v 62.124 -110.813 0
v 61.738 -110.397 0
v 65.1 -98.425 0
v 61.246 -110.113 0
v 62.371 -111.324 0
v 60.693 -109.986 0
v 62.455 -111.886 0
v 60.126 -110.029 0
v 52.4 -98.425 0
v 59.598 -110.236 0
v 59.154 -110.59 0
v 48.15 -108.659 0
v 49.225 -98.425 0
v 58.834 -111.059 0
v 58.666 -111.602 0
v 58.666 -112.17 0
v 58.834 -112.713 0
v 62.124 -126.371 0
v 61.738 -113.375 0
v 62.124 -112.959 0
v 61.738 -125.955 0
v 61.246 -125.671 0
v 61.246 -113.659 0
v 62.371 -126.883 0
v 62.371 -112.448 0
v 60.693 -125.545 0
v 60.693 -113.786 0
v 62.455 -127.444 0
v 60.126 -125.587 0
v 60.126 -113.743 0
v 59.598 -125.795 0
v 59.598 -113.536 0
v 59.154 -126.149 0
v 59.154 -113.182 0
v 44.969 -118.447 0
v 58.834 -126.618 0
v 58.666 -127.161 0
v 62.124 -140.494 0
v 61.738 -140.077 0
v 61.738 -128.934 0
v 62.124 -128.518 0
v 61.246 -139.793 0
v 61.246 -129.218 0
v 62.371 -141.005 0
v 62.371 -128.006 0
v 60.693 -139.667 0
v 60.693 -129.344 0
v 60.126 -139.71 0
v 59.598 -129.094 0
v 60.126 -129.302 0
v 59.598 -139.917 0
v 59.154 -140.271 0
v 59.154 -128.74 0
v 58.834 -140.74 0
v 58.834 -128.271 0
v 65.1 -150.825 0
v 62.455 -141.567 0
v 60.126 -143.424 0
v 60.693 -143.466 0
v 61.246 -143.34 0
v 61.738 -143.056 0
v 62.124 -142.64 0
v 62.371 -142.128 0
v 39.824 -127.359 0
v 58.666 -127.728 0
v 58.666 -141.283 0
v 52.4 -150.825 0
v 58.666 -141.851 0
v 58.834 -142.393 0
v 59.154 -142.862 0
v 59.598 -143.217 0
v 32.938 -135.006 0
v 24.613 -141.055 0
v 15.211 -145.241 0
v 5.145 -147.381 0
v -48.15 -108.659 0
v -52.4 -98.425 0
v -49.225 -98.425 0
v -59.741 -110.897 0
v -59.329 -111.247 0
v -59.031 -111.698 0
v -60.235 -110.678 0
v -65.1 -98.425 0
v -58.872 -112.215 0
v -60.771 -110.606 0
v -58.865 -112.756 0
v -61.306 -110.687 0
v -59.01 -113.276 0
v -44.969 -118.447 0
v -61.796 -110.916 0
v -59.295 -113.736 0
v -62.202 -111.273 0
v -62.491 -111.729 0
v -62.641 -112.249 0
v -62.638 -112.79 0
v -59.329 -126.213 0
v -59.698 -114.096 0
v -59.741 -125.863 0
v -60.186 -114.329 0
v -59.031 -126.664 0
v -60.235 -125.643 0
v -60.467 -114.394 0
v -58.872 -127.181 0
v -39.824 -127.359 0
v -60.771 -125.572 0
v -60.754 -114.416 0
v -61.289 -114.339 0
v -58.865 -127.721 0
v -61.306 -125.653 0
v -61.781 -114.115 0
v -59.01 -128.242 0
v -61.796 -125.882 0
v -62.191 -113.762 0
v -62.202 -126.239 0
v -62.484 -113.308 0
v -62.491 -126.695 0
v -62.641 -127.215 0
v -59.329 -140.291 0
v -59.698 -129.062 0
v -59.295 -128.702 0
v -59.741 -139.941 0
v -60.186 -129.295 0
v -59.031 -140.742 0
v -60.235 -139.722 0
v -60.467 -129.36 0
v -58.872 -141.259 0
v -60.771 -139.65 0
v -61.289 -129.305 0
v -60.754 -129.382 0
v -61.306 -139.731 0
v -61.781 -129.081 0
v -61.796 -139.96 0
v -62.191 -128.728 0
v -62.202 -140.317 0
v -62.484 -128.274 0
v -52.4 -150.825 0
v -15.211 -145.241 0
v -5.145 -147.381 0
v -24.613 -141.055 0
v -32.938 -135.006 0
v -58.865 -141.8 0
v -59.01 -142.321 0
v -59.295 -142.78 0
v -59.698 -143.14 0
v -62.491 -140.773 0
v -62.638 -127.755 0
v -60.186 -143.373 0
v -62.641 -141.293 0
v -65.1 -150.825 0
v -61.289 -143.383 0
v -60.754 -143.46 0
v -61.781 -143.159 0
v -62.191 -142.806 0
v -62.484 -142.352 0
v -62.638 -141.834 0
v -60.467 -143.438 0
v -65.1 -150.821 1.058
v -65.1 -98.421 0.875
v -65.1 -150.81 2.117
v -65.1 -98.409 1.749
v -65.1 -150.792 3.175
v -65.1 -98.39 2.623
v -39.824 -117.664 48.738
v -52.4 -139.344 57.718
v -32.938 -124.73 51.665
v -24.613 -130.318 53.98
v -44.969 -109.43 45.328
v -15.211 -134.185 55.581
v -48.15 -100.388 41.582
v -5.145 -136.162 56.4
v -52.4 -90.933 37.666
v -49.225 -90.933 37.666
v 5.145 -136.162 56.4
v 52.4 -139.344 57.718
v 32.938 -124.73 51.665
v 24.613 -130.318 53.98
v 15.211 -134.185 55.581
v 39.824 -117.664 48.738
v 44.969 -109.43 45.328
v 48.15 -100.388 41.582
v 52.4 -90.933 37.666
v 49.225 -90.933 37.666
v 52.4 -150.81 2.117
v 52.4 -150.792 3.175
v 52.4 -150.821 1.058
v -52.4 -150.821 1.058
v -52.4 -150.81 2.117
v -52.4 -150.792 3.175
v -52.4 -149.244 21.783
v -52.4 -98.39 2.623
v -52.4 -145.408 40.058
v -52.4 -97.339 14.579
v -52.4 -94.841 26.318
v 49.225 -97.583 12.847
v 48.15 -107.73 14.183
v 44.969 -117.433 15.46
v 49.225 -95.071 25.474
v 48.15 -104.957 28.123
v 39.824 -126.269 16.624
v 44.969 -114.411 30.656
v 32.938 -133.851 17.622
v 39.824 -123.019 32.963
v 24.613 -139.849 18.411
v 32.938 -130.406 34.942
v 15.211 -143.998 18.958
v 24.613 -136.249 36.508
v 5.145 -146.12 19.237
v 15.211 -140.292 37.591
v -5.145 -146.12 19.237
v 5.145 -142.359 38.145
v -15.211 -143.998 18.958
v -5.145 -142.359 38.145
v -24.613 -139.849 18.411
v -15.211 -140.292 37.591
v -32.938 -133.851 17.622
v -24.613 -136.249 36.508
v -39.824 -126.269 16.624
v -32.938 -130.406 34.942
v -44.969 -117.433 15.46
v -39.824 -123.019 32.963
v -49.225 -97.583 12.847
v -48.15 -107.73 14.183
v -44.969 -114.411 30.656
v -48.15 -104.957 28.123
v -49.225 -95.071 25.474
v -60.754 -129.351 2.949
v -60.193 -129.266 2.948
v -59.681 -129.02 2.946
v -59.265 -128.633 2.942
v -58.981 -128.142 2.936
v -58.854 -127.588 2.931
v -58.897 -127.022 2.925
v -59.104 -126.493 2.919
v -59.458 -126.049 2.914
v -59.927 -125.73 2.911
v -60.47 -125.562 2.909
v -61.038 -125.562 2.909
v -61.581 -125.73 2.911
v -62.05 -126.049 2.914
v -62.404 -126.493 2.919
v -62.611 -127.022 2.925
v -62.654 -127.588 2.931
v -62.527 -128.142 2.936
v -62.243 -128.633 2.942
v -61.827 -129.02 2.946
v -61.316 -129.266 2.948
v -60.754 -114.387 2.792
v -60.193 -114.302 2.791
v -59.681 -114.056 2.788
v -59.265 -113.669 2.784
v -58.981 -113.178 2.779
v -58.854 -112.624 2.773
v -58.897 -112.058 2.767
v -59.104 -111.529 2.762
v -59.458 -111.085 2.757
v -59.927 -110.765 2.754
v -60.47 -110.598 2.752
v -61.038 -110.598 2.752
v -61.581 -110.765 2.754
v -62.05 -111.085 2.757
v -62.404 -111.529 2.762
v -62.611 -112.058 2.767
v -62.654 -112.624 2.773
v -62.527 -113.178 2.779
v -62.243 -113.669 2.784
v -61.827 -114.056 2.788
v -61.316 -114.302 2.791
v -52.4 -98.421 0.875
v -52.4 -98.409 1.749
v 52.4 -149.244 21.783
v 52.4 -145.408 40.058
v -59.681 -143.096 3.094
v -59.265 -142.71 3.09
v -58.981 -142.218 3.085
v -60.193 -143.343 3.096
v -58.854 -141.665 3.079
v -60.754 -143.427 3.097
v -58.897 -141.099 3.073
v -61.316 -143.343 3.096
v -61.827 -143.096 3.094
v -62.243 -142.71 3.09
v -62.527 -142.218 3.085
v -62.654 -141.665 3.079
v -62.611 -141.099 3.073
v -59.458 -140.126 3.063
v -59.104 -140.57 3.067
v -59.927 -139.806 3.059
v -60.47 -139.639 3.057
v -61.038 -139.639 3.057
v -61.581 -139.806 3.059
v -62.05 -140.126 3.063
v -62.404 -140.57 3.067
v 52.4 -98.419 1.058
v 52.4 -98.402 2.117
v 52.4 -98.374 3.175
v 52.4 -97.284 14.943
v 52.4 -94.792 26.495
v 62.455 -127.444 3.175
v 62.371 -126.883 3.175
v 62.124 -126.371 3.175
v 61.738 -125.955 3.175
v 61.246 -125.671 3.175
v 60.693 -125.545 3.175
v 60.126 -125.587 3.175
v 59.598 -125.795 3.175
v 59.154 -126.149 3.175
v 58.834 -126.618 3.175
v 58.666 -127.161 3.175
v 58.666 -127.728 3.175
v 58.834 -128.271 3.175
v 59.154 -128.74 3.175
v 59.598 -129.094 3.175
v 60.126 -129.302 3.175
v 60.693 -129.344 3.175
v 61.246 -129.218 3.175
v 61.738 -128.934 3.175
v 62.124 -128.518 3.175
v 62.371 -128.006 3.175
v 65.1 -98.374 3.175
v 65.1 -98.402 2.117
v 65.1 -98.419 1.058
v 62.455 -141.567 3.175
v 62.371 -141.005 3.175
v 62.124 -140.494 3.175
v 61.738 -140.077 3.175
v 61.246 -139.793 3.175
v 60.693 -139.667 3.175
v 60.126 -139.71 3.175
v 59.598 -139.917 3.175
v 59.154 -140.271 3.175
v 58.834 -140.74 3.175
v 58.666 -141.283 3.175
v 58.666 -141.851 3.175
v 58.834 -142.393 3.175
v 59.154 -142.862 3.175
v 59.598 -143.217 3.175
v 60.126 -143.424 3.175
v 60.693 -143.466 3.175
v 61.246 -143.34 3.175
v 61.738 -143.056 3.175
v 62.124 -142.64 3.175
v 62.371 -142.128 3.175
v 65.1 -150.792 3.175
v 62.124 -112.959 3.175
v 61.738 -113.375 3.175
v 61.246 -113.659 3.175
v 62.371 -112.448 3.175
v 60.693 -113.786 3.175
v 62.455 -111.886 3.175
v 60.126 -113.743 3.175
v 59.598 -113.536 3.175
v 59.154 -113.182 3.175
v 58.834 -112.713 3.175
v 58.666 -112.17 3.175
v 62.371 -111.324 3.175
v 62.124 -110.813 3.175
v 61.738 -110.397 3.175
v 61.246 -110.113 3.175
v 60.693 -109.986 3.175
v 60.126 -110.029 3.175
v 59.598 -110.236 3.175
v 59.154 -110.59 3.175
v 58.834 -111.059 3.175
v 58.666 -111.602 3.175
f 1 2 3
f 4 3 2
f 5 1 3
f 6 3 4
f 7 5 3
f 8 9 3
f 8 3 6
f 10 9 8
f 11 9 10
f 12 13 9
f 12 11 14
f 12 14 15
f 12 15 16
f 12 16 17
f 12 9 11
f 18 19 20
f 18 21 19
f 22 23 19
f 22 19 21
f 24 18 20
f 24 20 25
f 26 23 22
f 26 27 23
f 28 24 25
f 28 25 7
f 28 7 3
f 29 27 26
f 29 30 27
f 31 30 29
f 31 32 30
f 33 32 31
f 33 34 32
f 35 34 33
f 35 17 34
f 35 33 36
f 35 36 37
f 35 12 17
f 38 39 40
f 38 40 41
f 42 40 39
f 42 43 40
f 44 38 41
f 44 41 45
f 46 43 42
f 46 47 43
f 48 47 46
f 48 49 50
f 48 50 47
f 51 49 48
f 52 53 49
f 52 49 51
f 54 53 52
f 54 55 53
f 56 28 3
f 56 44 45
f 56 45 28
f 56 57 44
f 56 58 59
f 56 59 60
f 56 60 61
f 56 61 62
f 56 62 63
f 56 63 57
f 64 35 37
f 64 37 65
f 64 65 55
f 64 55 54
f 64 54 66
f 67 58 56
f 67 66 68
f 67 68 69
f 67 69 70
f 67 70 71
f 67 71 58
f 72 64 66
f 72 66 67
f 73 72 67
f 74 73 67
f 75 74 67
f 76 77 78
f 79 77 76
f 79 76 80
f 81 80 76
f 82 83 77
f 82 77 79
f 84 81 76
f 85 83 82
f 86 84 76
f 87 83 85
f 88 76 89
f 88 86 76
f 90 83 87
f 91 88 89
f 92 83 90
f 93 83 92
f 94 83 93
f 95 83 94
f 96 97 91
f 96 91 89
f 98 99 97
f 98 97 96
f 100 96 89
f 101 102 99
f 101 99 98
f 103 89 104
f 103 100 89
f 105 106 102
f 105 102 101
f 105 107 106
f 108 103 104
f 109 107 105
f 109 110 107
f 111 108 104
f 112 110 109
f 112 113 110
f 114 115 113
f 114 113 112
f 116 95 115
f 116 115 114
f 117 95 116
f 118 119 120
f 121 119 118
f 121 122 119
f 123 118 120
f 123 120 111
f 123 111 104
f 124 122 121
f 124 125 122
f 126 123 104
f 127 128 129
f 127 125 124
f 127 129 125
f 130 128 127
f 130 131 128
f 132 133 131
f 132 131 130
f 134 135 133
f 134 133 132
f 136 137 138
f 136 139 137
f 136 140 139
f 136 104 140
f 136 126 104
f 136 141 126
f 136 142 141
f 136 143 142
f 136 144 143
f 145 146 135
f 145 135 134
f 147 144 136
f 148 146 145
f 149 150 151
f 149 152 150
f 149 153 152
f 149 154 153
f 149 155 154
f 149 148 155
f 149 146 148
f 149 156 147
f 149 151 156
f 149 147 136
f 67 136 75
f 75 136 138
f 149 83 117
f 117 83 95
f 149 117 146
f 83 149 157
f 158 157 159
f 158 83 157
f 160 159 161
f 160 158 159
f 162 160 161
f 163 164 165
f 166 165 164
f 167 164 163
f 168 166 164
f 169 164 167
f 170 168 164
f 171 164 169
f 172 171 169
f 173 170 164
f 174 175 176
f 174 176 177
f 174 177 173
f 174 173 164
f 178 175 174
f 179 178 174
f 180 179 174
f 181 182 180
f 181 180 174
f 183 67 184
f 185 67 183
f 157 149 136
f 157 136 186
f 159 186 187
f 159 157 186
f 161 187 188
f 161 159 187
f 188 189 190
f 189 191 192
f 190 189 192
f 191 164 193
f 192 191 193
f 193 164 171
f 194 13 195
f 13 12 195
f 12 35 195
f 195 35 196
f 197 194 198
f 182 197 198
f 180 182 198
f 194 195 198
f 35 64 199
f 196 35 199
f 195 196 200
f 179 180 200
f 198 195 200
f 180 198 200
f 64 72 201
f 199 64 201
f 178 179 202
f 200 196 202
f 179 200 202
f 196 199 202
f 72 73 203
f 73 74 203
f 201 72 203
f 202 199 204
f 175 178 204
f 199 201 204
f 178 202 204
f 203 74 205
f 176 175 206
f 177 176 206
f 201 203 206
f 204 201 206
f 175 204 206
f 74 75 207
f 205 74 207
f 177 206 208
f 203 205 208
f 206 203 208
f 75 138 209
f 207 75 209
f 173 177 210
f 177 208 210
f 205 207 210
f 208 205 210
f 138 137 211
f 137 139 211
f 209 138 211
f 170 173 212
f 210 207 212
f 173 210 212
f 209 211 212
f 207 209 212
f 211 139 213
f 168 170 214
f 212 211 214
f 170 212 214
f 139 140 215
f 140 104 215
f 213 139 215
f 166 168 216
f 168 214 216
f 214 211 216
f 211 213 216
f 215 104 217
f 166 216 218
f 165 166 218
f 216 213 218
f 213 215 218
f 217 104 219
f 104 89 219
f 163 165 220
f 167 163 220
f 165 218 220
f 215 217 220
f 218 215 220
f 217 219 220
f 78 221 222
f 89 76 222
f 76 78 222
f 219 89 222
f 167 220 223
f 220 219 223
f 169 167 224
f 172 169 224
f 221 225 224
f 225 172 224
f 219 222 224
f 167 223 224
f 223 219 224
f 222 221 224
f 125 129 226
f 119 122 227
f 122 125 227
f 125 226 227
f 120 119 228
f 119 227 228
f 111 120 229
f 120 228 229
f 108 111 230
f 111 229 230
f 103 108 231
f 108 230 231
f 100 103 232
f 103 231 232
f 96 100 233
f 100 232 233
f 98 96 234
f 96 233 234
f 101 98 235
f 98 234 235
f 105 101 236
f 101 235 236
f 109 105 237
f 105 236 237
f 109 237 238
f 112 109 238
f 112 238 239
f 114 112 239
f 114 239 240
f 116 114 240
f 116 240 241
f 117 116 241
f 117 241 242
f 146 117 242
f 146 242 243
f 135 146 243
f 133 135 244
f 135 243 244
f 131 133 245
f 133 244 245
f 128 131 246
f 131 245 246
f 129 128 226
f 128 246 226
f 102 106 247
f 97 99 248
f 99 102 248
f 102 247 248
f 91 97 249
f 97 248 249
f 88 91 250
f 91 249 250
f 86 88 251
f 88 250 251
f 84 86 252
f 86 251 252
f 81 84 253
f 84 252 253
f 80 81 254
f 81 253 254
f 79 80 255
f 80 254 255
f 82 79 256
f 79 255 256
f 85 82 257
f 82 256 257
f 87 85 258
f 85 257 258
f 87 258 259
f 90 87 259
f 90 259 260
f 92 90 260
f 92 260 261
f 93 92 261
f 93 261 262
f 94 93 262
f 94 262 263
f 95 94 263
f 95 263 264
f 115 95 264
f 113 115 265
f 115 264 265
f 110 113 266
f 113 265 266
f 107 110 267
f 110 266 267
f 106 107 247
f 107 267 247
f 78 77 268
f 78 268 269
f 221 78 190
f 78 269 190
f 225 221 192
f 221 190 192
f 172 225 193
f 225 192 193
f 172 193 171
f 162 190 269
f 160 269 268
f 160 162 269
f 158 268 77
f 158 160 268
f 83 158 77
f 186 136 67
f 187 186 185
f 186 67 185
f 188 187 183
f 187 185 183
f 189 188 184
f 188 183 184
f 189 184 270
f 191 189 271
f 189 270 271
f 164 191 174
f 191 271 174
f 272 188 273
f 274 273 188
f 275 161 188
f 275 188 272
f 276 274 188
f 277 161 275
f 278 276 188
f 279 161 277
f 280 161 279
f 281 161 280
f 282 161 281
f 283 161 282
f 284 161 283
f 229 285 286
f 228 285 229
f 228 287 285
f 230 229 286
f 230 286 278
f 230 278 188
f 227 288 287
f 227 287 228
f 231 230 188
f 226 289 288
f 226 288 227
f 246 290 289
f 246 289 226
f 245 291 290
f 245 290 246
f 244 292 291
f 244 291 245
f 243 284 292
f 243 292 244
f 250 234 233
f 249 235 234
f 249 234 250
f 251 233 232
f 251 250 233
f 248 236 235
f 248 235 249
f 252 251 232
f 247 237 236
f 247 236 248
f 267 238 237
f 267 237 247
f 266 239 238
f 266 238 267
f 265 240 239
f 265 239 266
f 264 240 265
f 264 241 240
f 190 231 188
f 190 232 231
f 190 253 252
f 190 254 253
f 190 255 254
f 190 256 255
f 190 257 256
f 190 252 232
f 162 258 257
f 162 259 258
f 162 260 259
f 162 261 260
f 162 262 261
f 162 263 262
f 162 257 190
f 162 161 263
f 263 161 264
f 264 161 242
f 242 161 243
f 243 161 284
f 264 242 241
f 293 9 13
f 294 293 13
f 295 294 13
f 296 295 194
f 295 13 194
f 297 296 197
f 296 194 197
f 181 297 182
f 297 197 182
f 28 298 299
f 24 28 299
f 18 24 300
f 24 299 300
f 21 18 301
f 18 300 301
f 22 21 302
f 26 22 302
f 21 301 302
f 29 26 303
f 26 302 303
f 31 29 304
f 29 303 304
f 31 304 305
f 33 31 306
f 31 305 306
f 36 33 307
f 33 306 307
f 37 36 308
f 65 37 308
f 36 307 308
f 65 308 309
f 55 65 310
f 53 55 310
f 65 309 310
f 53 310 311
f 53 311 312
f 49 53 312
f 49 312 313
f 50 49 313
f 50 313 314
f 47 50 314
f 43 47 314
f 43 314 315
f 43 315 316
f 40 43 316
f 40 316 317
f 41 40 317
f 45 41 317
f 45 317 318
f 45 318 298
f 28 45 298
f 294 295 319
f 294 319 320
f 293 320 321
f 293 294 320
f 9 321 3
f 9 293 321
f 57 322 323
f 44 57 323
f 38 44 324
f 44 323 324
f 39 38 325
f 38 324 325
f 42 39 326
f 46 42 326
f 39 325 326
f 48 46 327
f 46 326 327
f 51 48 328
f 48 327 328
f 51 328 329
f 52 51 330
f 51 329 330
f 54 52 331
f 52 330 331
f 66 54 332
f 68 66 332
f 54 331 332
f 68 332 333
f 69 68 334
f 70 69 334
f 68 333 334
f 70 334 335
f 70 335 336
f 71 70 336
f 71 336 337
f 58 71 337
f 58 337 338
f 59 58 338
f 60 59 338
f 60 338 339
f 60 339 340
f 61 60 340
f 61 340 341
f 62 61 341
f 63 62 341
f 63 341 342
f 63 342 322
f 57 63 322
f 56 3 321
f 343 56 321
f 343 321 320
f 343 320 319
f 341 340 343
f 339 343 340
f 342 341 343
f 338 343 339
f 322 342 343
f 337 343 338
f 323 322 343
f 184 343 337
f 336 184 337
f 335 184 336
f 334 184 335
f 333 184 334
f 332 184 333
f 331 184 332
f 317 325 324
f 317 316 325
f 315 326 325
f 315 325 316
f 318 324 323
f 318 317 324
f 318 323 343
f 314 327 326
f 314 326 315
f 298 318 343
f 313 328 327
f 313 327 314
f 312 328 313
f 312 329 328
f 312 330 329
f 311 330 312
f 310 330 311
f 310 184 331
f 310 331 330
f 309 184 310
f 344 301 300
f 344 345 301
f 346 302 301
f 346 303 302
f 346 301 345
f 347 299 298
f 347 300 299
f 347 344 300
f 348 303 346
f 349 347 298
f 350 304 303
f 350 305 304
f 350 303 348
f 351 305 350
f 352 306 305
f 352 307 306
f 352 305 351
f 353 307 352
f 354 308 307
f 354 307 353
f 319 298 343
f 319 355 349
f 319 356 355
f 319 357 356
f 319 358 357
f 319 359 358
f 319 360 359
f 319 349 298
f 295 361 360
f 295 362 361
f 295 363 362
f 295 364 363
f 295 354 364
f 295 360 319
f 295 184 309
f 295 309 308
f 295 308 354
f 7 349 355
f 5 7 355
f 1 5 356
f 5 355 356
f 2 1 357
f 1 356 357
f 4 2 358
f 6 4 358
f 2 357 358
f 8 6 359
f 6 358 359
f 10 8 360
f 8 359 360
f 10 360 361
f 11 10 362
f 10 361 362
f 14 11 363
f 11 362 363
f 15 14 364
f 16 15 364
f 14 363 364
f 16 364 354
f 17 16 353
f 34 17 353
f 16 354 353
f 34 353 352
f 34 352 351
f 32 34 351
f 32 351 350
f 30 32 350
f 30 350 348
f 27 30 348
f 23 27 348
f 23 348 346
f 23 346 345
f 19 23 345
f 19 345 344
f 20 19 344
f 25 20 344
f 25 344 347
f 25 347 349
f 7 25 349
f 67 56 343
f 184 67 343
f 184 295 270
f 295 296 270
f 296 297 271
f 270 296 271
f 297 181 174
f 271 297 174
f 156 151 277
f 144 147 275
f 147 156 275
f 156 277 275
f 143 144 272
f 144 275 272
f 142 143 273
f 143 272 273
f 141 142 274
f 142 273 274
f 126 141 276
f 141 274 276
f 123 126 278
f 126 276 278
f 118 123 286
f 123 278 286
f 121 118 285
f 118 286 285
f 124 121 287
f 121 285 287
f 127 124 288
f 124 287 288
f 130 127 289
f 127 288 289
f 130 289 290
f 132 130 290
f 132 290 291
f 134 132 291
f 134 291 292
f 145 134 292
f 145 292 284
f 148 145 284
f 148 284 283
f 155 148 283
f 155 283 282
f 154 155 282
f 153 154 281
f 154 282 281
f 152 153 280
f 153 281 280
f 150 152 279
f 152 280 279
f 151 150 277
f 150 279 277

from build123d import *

# Parameters (mm, degrees)
REVOLVE8_ANGLE      = 22.5
BOSS_EXTRUDE3_START = 12.7
BOSS_EXTRUDE3_DEPTH = 12.7
BOSS_EXTRUDE4_DEPTH = 12.7
SKETCH12_R          = 1.905
CUT_EXTRUDE4_DEPTH  = 3.175
SKETCH13_R          = 1.905
CUT_EXTRUDE5_DEPTH  = 3.175


with BuildPart() as part:
    # Sketch9 → Revolve8 (revolve)
    with BuildSketch(Plane.XY):
        with BuildLine():
            Line((-49.2252, -98.425), (-52.4002, -98.425))
            Line((-52.4002, -98.425), (-52.4002, -150.8252))
            Line((-52.4002, -150.8252), (52.4002, -150.8252))
            Line((52.4002, -150.8252), (52.4002, -98.425))
            Line((52.4002, -98.425), (49.2252, -98.425))
            ThreePointArc((49.2252, -98.425), (0, -147.6502), (-49.2252, -98.425))
        make_face()
    revolve(axis=Axis((-38.048924234, 0, 0), (-1, 0, 0)), revolution_arc=REVOLVE8_ANGLE)

    # Sketch11 → Boss-Extrude3 (add)
    with BuildSketch(Plane.ZY.offset(52.4002).offset(BOSS_EXTRUDE3_START)):
        with BuildLine():
            Line((0, -98.425), (0, -150.8252))
            ThreePointArc((0, -150.8252), (1.5875, -150.816845209), (3.174824124, -150.791781762))
            Line((3.174824124, -150.791781762), (2.623242695, -98.390036197))
            ThreePointArc((2.623242695, -98.390036197), (1.311737846, -98.416258661), (0, -98.425))
        make_face()
    extrude(amount=-BOSS_EXTRUDE3_DEPTH)

    # Sketch10 → Boss-Extrude4 (add)
    with BuildSketch(Plane(origin=(52.4002, 0, 0), x_dir=(0, 0, -1), z_dir=(1, 0, 0))):
        with BuildLine():
            Line((0, -98.425), (0, -150.8252))
            Line((0, -150.8252), (-3.174824124, -150.791781762))
            Line((-3.174824124, -150.791781762), (-3.174824124, -98.37378267))
            ThreePointArc((-3.174824124, -98.37378267), (-1.587618613, -98.412194834), (0, -98.425))
        make_face()
    extrude(amount=BOSS_EXTRUDE4_DEPTH)

    # Sketch12 → Cut-Extrude4 (cut)
    with BuildSketch(Plane.XY.offset(3.174824124)):
        with Locations((60.550186424, -111.886000657)):
            Circle(SKETCH12_R)
        with Locations((60.550186424, -141.566764633)):
            Circle(SKETCH12_R)
        with Locations((60.550186424, -127.4445)):
            Circle(SKETCH12_R)
    extrude(amount=-CUT_EXTRUDE4_DEPTH, mode=Mode.SUBTRACT)

    # Sketch13 → Cut-Extrude5 (cut)
    with BuildSketch(Plane(origin=(0, -0.008353865, 1.587675876), x_dir=(1, 0, 0), z_dir=(-8.55203915581382e-15, 0.010525429437517081, 0.9999446061333377))):
        with Locations(Location((-60.754019077, -141.521938379, 0), (0, 0, 270))):
            Circle(SKETCH13_R)
        with Locations(Location((-60.754019077, -112.479497113, 0), (0, 0, 270))):
            Circle(SKETCH13_R)
        with Locations(Location((-60.754019077, -127.4445, 0), (0, 0, 270))):
            Circle(SKETCH13_R)
    extrude(amount=-CUT_EXTRUDE5_DEPTH, mode=Mode.SUBTRACT)


solid = part.part
